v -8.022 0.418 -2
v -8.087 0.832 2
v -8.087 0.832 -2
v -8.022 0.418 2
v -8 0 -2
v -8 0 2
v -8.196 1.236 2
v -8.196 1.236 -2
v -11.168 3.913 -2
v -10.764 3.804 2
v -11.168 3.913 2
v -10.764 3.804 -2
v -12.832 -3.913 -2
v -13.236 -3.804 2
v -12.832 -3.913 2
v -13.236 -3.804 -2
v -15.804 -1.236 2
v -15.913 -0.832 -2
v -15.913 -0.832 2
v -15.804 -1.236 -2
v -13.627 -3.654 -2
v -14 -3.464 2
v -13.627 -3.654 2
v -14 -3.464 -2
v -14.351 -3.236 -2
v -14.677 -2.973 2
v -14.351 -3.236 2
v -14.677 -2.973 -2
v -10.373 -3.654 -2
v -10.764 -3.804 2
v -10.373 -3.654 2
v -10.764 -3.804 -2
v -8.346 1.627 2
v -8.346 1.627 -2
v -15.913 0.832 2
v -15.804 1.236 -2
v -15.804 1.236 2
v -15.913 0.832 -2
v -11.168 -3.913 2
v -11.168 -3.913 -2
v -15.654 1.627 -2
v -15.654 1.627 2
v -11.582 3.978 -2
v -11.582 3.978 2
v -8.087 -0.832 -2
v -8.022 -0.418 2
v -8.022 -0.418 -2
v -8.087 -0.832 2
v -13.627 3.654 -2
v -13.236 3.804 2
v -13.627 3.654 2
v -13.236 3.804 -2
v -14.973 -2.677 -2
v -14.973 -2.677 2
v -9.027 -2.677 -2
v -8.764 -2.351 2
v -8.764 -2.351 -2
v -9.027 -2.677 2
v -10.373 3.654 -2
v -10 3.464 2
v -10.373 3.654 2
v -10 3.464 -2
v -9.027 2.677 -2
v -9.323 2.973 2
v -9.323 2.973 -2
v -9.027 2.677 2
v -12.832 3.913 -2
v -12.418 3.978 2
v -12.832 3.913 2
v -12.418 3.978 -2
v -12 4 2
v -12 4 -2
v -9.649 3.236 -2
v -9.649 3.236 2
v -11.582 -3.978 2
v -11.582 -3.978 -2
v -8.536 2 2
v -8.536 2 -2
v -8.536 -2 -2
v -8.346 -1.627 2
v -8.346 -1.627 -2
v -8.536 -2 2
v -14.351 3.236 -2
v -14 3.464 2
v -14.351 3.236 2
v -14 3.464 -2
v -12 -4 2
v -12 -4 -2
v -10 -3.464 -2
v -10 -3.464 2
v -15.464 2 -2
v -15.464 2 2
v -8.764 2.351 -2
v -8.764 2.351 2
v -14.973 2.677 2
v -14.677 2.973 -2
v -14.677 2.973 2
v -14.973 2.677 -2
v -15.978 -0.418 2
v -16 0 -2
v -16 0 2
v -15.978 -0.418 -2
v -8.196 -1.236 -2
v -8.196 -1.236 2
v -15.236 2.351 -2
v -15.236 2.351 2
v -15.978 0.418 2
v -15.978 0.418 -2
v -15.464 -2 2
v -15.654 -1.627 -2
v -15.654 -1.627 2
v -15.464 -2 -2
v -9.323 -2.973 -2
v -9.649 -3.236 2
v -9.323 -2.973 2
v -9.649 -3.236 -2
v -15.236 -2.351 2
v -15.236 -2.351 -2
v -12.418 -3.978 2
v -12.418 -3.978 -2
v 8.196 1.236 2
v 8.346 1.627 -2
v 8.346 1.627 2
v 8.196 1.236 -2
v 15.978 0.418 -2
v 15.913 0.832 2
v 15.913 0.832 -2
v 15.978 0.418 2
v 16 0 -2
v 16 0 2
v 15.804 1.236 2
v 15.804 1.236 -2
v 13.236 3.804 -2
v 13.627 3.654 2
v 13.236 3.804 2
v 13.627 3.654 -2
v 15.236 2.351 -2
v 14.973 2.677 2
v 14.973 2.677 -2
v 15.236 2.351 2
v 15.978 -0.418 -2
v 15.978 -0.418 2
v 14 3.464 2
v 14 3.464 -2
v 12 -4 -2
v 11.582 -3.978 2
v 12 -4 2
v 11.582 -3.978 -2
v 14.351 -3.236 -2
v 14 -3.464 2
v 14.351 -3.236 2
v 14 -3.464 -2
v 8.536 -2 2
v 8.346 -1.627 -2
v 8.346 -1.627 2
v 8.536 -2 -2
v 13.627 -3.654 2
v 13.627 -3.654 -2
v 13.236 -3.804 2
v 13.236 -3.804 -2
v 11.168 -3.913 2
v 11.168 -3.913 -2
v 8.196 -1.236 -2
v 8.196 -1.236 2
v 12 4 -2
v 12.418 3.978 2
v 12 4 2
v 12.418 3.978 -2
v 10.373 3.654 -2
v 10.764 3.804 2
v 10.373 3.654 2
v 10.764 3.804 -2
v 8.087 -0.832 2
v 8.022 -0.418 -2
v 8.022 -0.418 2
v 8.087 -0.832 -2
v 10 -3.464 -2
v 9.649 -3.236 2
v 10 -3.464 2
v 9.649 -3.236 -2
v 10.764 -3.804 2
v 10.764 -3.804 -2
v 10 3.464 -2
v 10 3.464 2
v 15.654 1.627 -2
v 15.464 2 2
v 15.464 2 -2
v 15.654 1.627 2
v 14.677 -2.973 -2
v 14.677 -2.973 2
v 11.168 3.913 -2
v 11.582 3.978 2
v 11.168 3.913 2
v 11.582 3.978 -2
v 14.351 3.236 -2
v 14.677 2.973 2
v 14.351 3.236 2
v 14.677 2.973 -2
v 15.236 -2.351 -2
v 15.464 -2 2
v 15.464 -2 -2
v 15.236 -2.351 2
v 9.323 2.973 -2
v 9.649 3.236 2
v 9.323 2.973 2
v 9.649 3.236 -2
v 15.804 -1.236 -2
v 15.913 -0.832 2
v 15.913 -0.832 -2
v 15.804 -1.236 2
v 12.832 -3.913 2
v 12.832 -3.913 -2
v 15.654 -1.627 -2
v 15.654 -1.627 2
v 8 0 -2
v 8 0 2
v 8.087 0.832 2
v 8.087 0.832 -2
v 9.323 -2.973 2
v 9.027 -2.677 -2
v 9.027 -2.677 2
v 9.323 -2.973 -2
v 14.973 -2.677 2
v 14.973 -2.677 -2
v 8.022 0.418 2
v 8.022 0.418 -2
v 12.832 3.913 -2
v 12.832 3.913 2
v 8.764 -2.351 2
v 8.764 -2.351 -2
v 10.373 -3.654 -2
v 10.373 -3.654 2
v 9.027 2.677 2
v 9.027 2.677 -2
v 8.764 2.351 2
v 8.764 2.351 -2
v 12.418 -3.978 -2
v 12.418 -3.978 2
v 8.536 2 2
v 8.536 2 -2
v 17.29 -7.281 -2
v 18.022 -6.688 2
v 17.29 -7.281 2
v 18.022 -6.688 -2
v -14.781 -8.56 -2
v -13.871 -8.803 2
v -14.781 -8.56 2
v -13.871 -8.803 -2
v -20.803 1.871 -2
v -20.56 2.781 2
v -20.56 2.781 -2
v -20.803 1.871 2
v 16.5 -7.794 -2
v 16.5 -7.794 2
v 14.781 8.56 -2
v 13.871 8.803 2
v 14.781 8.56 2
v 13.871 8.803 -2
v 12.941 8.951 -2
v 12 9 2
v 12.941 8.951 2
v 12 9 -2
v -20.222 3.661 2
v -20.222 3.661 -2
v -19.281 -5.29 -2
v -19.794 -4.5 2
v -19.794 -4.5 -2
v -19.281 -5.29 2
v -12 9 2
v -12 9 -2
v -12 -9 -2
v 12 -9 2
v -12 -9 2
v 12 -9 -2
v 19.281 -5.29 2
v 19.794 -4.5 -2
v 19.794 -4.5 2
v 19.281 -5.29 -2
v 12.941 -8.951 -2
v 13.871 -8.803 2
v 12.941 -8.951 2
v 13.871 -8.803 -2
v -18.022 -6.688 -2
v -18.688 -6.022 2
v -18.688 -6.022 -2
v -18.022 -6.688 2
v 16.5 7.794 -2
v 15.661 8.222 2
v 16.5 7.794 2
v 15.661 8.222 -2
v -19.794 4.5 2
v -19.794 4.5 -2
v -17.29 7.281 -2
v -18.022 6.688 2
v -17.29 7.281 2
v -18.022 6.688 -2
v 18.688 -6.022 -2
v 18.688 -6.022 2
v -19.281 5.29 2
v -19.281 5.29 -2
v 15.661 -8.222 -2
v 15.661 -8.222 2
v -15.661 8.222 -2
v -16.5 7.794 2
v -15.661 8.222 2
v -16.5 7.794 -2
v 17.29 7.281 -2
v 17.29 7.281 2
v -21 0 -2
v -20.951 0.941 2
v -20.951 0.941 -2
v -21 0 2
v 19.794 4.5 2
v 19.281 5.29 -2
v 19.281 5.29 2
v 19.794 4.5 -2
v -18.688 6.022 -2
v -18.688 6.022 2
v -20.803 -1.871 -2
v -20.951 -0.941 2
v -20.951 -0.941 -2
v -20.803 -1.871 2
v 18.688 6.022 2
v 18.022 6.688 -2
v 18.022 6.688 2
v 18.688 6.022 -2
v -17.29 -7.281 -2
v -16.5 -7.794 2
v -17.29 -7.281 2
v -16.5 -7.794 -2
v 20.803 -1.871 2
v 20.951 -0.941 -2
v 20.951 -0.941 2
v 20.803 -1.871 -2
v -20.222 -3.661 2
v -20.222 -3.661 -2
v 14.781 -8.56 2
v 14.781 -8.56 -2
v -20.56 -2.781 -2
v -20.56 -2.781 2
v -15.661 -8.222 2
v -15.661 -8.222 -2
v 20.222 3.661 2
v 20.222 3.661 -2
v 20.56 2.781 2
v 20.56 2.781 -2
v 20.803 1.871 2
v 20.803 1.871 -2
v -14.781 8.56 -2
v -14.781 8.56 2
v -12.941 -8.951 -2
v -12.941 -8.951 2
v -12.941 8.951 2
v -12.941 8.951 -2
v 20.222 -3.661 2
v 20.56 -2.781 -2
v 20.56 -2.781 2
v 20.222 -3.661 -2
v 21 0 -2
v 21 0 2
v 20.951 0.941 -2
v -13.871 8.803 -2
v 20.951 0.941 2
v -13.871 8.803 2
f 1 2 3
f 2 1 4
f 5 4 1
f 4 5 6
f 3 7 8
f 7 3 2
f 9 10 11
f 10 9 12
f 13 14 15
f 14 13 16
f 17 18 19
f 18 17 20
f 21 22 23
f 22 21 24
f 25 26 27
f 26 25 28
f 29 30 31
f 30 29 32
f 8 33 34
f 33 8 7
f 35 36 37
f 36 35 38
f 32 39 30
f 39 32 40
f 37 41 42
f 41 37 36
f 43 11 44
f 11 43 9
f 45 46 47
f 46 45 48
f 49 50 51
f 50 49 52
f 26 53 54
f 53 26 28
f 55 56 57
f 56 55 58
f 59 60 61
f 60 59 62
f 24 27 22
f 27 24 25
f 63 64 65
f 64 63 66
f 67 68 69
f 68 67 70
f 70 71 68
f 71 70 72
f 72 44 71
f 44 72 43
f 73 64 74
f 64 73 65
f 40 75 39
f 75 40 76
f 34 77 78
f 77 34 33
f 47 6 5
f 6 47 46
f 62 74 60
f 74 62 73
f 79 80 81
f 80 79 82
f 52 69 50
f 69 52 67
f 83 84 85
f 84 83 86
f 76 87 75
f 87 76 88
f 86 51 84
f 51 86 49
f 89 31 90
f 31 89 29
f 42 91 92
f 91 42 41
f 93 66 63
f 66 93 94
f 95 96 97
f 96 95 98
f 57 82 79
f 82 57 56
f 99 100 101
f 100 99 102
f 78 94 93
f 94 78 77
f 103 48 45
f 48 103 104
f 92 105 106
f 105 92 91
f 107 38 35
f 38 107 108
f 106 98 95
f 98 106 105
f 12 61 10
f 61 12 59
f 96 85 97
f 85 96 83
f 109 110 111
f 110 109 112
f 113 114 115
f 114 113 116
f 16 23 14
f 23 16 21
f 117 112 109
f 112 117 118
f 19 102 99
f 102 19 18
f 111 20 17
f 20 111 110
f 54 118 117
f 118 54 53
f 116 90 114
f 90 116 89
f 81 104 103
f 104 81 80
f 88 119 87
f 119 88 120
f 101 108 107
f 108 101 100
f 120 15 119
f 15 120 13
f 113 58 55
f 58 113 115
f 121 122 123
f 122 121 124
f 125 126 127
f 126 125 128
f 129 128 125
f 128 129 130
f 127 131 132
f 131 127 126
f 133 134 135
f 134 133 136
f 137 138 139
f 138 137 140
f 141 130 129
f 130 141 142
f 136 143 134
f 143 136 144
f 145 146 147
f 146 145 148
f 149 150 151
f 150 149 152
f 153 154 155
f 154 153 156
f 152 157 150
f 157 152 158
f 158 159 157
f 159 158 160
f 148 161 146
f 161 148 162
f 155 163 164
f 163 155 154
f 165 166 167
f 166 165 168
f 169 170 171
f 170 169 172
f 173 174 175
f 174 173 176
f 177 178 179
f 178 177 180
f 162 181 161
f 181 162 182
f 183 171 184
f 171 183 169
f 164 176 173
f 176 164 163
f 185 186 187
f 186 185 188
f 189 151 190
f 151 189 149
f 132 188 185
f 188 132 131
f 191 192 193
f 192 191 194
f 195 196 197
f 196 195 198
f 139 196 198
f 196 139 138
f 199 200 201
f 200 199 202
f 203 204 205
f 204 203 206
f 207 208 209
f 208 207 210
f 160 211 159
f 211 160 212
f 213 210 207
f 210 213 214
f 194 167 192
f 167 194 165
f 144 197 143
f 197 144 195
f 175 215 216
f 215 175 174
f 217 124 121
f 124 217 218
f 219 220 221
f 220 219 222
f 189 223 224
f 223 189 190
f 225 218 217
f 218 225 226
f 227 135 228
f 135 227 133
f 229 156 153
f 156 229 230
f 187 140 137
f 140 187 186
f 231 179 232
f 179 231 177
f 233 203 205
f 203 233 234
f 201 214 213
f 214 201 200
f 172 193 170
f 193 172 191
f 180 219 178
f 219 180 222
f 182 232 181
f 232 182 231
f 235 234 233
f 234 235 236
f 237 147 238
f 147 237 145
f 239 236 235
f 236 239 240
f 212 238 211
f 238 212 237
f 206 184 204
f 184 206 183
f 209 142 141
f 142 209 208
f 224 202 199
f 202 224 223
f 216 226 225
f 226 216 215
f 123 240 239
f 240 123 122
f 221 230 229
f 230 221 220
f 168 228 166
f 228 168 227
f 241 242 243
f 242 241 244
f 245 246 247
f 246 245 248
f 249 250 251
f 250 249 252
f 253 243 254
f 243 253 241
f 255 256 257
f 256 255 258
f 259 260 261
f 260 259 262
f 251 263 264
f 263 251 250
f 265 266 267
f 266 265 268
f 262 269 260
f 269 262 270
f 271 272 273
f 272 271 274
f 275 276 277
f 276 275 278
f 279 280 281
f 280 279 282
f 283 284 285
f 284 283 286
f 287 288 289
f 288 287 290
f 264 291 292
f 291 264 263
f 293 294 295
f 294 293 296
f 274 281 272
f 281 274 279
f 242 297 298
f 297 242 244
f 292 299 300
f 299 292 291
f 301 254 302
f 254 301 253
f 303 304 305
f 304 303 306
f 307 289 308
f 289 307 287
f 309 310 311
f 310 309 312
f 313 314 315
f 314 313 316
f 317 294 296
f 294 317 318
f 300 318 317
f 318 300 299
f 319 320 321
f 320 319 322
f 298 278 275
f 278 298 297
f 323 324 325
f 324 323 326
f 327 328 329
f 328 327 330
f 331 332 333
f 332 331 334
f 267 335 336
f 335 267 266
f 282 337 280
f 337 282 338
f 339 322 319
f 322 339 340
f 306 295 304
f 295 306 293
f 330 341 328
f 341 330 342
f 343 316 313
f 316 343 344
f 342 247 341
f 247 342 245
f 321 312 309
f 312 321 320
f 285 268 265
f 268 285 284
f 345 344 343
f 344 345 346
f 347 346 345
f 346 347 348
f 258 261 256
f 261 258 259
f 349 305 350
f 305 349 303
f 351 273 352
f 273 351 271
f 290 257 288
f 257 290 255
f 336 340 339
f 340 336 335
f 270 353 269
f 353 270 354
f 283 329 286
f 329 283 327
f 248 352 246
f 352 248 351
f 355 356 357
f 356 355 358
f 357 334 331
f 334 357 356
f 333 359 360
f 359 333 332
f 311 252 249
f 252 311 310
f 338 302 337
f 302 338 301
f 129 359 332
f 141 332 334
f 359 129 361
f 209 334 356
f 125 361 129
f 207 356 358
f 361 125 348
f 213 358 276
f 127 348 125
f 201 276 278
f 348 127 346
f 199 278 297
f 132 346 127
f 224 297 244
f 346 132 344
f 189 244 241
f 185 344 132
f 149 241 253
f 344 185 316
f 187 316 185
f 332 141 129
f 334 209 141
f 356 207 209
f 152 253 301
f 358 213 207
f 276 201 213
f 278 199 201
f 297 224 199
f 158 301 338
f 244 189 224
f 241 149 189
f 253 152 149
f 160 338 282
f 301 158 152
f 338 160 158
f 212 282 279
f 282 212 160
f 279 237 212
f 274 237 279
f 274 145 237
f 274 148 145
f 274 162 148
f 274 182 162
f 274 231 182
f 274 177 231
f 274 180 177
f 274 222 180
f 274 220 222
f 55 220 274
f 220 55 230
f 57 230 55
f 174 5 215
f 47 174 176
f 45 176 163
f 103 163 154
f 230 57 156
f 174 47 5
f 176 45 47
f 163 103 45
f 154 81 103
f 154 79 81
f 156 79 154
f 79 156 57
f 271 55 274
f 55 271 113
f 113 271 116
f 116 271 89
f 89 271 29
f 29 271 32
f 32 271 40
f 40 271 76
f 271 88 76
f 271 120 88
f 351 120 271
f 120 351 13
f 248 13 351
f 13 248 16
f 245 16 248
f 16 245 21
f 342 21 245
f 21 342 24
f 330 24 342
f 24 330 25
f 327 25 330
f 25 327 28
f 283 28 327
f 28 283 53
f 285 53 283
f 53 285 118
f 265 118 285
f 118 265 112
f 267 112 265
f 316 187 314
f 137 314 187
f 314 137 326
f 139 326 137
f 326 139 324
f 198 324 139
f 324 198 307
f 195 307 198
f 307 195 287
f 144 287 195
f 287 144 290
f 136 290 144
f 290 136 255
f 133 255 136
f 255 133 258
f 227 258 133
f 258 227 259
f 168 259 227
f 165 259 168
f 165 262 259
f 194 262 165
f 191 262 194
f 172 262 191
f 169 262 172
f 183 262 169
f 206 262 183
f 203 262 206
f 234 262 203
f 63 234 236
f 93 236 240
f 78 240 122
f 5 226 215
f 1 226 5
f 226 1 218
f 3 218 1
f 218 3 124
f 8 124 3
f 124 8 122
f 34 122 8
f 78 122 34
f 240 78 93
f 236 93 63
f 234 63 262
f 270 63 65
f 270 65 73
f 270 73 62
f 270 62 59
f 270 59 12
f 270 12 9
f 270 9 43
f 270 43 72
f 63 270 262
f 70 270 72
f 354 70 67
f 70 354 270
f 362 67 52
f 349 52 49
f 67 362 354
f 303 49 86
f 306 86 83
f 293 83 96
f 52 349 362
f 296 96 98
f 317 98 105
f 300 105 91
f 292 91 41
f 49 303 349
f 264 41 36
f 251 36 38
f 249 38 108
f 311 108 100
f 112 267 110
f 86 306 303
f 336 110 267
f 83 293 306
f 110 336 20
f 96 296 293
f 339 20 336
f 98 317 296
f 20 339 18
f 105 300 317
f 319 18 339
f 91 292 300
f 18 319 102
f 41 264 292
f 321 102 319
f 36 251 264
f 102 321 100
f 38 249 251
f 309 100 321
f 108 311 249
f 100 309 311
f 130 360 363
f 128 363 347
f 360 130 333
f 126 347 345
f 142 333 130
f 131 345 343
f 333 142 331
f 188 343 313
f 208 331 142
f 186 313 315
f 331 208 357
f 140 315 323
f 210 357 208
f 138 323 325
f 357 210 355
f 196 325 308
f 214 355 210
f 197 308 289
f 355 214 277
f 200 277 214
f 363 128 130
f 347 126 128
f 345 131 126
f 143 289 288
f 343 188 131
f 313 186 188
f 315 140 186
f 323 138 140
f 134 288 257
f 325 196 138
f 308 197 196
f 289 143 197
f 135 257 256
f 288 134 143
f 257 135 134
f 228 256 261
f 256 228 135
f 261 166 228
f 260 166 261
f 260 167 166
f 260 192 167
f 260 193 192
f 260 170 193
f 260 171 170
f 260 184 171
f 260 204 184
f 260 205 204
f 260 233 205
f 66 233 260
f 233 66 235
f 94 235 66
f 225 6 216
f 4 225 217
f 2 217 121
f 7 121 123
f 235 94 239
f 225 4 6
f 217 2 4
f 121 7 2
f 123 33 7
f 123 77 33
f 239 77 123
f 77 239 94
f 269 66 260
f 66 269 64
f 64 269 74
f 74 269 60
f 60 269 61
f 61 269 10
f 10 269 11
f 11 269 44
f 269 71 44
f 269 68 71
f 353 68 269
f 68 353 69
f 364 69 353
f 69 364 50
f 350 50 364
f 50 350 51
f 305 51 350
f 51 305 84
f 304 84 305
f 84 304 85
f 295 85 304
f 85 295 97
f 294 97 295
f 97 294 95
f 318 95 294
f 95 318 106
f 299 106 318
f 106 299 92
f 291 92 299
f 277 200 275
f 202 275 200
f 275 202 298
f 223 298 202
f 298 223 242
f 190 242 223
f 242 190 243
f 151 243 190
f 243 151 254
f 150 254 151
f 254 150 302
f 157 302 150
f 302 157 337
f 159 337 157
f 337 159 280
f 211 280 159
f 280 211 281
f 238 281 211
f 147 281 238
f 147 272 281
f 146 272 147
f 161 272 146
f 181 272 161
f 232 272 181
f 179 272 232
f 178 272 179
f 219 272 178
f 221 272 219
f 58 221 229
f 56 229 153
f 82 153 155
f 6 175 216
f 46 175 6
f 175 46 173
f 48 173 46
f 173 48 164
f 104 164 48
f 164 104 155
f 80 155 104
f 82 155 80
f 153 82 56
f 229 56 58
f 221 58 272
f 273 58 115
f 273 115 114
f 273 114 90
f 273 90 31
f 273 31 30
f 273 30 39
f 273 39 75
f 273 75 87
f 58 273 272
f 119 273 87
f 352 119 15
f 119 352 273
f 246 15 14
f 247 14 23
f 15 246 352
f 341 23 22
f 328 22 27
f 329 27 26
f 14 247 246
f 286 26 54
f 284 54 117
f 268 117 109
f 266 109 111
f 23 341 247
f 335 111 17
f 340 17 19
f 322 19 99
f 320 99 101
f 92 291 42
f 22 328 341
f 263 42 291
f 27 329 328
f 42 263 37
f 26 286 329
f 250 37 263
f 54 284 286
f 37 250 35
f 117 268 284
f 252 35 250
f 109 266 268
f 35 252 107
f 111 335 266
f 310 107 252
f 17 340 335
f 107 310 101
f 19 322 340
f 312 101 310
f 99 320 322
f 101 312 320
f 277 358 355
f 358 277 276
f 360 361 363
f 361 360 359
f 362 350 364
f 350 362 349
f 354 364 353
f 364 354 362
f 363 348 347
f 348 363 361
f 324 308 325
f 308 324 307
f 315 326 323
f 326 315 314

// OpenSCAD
// Two-hole link plate.
$fn = 60;
eps = 0.02;
hole_d = 8;
length = 42;
width = 18;
thickness = 4;
difference() { hull() { translate([-length/2+width/2,0,0]) cylinder(d=width,h=thickness,center=true); translate([length/2-width/2,0,0]) cylinder(d=width,h=thickness,center=true); } for(x=[-length/2+width/2,length/2-width/2]) translate([x,0,-thickness/2-eps]) cylinder(d=hole_d,h=thickness+2*eps); }
